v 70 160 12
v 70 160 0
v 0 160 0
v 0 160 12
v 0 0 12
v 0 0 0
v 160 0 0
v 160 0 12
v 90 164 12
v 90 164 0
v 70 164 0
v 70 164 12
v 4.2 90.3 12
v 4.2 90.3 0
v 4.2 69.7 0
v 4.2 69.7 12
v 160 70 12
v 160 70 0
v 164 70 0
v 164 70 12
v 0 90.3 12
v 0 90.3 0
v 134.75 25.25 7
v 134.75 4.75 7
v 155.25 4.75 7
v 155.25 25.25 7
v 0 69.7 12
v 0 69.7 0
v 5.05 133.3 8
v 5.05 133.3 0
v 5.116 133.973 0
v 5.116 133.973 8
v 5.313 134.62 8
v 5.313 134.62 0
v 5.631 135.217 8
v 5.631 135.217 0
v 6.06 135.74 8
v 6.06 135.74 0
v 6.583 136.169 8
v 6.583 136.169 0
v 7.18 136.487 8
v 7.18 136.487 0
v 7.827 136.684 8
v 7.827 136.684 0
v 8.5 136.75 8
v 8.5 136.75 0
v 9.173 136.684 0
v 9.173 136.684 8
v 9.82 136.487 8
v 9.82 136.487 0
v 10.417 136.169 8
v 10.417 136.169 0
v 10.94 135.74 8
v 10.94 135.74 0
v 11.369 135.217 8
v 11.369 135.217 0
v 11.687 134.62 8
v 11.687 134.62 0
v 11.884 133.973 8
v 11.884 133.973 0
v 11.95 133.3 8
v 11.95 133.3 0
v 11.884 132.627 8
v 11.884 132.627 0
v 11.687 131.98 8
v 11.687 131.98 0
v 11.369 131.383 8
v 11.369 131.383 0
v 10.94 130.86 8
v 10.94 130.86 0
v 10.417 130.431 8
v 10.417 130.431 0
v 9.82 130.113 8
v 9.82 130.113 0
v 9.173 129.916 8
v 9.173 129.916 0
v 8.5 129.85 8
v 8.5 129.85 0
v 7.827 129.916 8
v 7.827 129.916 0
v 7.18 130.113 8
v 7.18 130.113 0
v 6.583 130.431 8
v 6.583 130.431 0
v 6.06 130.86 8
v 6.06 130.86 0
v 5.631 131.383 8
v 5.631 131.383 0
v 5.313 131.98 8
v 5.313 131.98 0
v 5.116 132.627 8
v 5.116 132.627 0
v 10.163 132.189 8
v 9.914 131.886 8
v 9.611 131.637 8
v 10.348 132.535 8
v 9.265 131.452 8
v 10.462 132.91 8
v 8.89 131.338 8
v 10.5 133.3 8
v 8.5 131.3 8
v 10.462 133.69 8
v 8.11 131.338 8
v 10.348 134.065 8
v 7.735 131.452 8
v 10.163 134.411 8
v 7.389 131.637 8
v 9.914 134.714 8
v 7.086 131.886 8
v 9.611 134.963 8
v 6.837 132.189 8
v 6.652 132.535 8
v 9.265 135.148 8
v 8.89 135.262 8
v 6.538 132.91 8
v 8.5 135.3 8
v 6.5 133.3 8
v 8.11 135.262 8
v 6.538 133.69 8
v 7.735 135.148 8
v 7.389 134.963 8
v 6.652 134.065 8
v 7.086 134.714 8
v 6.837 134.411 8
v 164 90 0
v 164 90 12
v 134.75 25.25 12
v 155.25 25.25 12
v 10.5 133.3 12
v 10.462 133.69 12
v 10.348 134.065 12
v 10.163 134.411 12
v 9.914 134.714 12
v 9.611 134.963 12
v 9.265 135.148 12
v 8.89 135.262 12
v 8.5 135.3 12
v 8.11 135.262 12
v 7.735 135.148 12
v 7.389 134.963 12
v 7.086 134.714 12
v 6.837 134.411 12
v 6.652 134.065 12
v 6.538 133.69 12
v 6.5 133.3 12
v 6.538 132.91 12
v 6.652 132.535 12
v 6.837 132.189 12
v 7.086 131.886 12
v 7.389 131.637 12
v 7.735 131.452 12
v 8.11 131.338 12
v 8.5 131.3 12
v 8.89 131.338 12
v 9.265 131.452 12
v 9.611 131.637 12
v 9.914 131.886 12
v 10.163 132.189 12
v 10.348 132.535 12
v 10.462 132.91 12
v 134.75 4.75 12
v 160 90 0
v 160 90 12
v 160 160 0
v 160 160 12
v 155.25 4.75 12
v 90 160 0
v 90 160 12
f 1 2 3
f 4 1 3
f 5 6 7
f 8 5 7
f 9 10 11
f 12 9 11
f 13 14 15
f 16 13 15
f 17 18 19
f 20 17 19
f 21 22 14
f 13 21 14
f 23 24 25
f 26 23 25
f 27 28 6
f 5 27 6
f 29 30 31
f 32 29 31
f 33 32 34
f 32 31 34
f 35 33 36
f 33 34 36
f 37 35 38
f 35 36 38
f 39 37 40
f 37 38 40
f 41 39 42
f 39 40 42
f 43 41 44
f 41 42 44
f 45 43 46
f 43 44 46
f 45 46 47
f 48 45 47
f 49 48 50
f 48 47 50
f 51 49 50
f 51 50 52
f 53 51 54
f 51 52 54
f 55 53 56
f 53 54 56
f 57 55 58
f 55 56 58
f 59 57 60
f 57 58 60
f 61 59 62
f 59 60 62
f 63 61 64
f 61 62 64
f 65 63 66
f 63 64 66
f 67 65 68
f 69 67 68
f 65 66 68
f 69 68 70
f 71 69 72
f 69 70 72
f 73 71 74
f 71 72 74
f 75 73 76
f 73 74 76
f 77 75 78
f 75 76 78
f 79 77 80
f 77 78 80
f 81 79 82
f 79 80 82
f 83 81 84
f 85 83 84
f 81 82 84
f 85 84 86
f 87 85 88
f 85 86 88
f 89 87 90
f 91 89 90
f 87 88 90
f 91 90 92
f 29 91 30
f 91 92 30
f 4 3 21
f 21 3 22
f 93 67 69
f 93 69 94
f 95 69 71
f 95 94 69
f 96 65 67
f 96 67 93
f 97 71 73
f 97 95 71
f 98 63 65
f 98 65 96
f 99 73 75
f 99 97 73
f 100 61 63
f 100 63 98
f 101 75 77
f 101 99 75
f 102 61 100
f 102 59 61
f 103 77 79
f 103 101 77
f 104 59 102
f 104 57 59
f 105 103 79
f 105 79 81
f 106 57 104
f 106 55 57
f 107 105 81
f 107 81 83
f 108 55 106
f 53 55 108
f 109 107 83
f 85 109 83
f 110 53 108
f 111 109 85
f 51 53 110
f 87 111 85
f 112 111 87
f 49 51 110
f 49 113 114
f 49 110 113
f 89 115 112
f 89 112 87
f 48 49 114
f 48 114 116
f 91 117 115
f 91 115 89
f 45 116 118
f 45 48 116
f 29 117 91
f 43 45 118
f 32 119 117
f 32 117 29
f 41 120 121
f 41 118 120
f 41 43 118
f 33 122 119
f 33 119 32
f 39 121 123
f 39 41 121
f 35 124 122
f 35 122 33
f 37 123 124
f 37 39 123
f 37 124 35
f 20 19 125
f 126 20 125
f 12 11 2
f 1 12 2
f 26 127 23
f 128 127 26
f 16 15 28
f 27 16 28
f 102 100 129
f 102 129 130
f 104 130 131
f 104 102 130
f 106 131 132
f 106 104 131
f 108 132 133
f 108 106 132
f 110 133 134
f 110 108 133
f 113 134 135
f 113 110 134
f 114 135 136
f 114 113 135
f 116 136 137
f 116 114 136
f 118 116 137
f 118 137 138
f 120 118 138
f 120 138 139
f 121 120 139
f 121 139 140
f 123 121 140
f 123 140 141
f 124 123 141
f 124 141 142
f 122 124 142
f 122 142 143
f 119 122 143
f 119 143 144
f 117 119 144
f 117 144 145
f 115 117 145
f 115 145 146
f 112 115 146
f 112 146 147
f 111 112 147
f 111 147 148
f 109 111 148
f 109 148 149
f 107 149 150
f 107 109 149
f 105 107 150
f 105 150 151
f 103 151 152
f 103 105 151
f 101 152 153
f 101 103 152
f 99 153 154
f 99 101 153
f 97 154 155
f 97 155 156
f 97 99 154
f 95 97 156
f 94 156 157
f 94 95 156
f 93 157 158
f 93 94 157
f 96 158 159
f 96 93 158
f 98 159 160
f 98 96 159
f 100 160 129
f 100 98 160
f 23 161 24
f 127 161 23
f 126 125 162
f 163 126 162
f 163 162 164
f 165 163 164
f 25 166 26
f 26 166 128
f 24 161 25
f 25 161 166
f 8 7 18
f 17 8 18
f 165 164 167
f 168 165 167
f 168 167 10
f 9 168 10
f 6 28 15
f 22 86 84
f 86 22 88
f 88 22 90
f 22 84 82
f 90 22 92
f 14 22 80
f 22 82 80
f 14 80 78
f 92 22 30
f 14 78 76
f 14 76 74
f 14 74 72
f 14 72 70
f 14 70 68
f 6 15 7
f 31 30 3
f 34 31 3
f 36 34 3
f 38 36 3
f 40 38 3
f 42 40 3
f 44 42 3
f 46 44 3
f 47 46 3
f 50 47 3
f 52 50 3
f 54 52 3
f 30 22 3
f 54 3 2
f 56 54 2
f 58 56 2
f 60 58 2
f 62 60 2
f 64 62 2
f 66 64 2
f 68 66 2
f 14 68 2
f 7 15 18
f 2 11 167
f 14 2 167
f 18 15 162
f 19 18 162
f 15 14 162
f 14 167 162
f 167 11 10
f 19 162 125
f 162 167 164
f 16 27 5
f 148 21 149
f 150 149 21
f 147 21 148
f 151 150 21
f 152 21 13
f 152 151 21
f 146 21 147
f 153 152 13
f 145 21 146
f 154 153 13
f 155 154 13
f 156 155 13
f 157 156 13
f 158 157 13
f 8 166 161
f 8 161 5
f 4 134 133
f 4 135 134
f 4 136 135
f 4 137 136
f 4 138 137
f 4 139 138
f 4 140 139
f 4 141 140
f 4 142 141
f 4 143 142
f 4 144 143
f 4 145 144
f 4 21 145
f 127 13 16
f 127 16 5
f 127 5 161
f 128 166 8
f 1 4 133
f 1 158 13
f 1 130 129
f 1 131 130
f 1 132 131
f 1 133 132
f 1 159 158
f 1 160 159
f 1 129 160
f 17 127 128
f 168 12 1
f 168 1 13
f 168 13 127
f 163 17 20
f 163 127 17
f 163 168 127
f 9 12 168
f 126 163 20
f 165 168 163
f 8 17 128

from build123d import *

# Parameters (mm, degrees)
SKETCH1_R           = 2
BOSS_EXTRUDE1_DEPTH = 12
SKETCH2_W           = 20.5
SKETCH2_H           = 20.5
CUT_EXTRUDE1_DEPTH  = 5
SKETCH3_R           = 3.45
CUT_EXTRUDE2_DEPTH  = 8


with BuildPart() as part:
    # Sketch1 → Boss-Extrude1 (new body)
    with BuildSketch(Plane.XY):
        Polygon((0, 0), (69.7, 0), (90.3, 0), (160, 0), (160, 70), (164, 70), (164, 90), (160, 90), (160, 160), (90, 160), (90, 164), (70, 164), (70, 160), (0, 160), (0, 90.3), (4.2, 90.3), (4.2, 69.7), (0, 69.7), align=None)
        with Locations((8.5, 133.3)):
            Circle(SKETCH1_R, mode=Mode.SUBTRACT)
    extrude(amount=BOSS_EXTRUDE1_DEPTH)

    # Sketch2 → Cut-Extrude1 (cut)
    with BuildSketch(Plane.XY.offset(12)):
        with Locations((145, 15)):
            Rectangle(SKETCH2_W, SKETCH2_H)
    extrude(amount=-CUT_EXTRUDE1_DEPTH, mode=Mode.SUBTRACT)

    # Sketch3 → Cut-Extrude2 (cut)
    with BuildSketch(Plane(origin=(0, 0, 0), x_dir=(-1, 0, 0), z_dir=(0, 0, -1))):
        with Locations((-8.5, 133.3)):
            Circle(SKETCH3_R)
    extrude(amount=-CUT_EXTRUDE2_DEPTH, mode=Mode.SUBTRACT)


solid = part.part
